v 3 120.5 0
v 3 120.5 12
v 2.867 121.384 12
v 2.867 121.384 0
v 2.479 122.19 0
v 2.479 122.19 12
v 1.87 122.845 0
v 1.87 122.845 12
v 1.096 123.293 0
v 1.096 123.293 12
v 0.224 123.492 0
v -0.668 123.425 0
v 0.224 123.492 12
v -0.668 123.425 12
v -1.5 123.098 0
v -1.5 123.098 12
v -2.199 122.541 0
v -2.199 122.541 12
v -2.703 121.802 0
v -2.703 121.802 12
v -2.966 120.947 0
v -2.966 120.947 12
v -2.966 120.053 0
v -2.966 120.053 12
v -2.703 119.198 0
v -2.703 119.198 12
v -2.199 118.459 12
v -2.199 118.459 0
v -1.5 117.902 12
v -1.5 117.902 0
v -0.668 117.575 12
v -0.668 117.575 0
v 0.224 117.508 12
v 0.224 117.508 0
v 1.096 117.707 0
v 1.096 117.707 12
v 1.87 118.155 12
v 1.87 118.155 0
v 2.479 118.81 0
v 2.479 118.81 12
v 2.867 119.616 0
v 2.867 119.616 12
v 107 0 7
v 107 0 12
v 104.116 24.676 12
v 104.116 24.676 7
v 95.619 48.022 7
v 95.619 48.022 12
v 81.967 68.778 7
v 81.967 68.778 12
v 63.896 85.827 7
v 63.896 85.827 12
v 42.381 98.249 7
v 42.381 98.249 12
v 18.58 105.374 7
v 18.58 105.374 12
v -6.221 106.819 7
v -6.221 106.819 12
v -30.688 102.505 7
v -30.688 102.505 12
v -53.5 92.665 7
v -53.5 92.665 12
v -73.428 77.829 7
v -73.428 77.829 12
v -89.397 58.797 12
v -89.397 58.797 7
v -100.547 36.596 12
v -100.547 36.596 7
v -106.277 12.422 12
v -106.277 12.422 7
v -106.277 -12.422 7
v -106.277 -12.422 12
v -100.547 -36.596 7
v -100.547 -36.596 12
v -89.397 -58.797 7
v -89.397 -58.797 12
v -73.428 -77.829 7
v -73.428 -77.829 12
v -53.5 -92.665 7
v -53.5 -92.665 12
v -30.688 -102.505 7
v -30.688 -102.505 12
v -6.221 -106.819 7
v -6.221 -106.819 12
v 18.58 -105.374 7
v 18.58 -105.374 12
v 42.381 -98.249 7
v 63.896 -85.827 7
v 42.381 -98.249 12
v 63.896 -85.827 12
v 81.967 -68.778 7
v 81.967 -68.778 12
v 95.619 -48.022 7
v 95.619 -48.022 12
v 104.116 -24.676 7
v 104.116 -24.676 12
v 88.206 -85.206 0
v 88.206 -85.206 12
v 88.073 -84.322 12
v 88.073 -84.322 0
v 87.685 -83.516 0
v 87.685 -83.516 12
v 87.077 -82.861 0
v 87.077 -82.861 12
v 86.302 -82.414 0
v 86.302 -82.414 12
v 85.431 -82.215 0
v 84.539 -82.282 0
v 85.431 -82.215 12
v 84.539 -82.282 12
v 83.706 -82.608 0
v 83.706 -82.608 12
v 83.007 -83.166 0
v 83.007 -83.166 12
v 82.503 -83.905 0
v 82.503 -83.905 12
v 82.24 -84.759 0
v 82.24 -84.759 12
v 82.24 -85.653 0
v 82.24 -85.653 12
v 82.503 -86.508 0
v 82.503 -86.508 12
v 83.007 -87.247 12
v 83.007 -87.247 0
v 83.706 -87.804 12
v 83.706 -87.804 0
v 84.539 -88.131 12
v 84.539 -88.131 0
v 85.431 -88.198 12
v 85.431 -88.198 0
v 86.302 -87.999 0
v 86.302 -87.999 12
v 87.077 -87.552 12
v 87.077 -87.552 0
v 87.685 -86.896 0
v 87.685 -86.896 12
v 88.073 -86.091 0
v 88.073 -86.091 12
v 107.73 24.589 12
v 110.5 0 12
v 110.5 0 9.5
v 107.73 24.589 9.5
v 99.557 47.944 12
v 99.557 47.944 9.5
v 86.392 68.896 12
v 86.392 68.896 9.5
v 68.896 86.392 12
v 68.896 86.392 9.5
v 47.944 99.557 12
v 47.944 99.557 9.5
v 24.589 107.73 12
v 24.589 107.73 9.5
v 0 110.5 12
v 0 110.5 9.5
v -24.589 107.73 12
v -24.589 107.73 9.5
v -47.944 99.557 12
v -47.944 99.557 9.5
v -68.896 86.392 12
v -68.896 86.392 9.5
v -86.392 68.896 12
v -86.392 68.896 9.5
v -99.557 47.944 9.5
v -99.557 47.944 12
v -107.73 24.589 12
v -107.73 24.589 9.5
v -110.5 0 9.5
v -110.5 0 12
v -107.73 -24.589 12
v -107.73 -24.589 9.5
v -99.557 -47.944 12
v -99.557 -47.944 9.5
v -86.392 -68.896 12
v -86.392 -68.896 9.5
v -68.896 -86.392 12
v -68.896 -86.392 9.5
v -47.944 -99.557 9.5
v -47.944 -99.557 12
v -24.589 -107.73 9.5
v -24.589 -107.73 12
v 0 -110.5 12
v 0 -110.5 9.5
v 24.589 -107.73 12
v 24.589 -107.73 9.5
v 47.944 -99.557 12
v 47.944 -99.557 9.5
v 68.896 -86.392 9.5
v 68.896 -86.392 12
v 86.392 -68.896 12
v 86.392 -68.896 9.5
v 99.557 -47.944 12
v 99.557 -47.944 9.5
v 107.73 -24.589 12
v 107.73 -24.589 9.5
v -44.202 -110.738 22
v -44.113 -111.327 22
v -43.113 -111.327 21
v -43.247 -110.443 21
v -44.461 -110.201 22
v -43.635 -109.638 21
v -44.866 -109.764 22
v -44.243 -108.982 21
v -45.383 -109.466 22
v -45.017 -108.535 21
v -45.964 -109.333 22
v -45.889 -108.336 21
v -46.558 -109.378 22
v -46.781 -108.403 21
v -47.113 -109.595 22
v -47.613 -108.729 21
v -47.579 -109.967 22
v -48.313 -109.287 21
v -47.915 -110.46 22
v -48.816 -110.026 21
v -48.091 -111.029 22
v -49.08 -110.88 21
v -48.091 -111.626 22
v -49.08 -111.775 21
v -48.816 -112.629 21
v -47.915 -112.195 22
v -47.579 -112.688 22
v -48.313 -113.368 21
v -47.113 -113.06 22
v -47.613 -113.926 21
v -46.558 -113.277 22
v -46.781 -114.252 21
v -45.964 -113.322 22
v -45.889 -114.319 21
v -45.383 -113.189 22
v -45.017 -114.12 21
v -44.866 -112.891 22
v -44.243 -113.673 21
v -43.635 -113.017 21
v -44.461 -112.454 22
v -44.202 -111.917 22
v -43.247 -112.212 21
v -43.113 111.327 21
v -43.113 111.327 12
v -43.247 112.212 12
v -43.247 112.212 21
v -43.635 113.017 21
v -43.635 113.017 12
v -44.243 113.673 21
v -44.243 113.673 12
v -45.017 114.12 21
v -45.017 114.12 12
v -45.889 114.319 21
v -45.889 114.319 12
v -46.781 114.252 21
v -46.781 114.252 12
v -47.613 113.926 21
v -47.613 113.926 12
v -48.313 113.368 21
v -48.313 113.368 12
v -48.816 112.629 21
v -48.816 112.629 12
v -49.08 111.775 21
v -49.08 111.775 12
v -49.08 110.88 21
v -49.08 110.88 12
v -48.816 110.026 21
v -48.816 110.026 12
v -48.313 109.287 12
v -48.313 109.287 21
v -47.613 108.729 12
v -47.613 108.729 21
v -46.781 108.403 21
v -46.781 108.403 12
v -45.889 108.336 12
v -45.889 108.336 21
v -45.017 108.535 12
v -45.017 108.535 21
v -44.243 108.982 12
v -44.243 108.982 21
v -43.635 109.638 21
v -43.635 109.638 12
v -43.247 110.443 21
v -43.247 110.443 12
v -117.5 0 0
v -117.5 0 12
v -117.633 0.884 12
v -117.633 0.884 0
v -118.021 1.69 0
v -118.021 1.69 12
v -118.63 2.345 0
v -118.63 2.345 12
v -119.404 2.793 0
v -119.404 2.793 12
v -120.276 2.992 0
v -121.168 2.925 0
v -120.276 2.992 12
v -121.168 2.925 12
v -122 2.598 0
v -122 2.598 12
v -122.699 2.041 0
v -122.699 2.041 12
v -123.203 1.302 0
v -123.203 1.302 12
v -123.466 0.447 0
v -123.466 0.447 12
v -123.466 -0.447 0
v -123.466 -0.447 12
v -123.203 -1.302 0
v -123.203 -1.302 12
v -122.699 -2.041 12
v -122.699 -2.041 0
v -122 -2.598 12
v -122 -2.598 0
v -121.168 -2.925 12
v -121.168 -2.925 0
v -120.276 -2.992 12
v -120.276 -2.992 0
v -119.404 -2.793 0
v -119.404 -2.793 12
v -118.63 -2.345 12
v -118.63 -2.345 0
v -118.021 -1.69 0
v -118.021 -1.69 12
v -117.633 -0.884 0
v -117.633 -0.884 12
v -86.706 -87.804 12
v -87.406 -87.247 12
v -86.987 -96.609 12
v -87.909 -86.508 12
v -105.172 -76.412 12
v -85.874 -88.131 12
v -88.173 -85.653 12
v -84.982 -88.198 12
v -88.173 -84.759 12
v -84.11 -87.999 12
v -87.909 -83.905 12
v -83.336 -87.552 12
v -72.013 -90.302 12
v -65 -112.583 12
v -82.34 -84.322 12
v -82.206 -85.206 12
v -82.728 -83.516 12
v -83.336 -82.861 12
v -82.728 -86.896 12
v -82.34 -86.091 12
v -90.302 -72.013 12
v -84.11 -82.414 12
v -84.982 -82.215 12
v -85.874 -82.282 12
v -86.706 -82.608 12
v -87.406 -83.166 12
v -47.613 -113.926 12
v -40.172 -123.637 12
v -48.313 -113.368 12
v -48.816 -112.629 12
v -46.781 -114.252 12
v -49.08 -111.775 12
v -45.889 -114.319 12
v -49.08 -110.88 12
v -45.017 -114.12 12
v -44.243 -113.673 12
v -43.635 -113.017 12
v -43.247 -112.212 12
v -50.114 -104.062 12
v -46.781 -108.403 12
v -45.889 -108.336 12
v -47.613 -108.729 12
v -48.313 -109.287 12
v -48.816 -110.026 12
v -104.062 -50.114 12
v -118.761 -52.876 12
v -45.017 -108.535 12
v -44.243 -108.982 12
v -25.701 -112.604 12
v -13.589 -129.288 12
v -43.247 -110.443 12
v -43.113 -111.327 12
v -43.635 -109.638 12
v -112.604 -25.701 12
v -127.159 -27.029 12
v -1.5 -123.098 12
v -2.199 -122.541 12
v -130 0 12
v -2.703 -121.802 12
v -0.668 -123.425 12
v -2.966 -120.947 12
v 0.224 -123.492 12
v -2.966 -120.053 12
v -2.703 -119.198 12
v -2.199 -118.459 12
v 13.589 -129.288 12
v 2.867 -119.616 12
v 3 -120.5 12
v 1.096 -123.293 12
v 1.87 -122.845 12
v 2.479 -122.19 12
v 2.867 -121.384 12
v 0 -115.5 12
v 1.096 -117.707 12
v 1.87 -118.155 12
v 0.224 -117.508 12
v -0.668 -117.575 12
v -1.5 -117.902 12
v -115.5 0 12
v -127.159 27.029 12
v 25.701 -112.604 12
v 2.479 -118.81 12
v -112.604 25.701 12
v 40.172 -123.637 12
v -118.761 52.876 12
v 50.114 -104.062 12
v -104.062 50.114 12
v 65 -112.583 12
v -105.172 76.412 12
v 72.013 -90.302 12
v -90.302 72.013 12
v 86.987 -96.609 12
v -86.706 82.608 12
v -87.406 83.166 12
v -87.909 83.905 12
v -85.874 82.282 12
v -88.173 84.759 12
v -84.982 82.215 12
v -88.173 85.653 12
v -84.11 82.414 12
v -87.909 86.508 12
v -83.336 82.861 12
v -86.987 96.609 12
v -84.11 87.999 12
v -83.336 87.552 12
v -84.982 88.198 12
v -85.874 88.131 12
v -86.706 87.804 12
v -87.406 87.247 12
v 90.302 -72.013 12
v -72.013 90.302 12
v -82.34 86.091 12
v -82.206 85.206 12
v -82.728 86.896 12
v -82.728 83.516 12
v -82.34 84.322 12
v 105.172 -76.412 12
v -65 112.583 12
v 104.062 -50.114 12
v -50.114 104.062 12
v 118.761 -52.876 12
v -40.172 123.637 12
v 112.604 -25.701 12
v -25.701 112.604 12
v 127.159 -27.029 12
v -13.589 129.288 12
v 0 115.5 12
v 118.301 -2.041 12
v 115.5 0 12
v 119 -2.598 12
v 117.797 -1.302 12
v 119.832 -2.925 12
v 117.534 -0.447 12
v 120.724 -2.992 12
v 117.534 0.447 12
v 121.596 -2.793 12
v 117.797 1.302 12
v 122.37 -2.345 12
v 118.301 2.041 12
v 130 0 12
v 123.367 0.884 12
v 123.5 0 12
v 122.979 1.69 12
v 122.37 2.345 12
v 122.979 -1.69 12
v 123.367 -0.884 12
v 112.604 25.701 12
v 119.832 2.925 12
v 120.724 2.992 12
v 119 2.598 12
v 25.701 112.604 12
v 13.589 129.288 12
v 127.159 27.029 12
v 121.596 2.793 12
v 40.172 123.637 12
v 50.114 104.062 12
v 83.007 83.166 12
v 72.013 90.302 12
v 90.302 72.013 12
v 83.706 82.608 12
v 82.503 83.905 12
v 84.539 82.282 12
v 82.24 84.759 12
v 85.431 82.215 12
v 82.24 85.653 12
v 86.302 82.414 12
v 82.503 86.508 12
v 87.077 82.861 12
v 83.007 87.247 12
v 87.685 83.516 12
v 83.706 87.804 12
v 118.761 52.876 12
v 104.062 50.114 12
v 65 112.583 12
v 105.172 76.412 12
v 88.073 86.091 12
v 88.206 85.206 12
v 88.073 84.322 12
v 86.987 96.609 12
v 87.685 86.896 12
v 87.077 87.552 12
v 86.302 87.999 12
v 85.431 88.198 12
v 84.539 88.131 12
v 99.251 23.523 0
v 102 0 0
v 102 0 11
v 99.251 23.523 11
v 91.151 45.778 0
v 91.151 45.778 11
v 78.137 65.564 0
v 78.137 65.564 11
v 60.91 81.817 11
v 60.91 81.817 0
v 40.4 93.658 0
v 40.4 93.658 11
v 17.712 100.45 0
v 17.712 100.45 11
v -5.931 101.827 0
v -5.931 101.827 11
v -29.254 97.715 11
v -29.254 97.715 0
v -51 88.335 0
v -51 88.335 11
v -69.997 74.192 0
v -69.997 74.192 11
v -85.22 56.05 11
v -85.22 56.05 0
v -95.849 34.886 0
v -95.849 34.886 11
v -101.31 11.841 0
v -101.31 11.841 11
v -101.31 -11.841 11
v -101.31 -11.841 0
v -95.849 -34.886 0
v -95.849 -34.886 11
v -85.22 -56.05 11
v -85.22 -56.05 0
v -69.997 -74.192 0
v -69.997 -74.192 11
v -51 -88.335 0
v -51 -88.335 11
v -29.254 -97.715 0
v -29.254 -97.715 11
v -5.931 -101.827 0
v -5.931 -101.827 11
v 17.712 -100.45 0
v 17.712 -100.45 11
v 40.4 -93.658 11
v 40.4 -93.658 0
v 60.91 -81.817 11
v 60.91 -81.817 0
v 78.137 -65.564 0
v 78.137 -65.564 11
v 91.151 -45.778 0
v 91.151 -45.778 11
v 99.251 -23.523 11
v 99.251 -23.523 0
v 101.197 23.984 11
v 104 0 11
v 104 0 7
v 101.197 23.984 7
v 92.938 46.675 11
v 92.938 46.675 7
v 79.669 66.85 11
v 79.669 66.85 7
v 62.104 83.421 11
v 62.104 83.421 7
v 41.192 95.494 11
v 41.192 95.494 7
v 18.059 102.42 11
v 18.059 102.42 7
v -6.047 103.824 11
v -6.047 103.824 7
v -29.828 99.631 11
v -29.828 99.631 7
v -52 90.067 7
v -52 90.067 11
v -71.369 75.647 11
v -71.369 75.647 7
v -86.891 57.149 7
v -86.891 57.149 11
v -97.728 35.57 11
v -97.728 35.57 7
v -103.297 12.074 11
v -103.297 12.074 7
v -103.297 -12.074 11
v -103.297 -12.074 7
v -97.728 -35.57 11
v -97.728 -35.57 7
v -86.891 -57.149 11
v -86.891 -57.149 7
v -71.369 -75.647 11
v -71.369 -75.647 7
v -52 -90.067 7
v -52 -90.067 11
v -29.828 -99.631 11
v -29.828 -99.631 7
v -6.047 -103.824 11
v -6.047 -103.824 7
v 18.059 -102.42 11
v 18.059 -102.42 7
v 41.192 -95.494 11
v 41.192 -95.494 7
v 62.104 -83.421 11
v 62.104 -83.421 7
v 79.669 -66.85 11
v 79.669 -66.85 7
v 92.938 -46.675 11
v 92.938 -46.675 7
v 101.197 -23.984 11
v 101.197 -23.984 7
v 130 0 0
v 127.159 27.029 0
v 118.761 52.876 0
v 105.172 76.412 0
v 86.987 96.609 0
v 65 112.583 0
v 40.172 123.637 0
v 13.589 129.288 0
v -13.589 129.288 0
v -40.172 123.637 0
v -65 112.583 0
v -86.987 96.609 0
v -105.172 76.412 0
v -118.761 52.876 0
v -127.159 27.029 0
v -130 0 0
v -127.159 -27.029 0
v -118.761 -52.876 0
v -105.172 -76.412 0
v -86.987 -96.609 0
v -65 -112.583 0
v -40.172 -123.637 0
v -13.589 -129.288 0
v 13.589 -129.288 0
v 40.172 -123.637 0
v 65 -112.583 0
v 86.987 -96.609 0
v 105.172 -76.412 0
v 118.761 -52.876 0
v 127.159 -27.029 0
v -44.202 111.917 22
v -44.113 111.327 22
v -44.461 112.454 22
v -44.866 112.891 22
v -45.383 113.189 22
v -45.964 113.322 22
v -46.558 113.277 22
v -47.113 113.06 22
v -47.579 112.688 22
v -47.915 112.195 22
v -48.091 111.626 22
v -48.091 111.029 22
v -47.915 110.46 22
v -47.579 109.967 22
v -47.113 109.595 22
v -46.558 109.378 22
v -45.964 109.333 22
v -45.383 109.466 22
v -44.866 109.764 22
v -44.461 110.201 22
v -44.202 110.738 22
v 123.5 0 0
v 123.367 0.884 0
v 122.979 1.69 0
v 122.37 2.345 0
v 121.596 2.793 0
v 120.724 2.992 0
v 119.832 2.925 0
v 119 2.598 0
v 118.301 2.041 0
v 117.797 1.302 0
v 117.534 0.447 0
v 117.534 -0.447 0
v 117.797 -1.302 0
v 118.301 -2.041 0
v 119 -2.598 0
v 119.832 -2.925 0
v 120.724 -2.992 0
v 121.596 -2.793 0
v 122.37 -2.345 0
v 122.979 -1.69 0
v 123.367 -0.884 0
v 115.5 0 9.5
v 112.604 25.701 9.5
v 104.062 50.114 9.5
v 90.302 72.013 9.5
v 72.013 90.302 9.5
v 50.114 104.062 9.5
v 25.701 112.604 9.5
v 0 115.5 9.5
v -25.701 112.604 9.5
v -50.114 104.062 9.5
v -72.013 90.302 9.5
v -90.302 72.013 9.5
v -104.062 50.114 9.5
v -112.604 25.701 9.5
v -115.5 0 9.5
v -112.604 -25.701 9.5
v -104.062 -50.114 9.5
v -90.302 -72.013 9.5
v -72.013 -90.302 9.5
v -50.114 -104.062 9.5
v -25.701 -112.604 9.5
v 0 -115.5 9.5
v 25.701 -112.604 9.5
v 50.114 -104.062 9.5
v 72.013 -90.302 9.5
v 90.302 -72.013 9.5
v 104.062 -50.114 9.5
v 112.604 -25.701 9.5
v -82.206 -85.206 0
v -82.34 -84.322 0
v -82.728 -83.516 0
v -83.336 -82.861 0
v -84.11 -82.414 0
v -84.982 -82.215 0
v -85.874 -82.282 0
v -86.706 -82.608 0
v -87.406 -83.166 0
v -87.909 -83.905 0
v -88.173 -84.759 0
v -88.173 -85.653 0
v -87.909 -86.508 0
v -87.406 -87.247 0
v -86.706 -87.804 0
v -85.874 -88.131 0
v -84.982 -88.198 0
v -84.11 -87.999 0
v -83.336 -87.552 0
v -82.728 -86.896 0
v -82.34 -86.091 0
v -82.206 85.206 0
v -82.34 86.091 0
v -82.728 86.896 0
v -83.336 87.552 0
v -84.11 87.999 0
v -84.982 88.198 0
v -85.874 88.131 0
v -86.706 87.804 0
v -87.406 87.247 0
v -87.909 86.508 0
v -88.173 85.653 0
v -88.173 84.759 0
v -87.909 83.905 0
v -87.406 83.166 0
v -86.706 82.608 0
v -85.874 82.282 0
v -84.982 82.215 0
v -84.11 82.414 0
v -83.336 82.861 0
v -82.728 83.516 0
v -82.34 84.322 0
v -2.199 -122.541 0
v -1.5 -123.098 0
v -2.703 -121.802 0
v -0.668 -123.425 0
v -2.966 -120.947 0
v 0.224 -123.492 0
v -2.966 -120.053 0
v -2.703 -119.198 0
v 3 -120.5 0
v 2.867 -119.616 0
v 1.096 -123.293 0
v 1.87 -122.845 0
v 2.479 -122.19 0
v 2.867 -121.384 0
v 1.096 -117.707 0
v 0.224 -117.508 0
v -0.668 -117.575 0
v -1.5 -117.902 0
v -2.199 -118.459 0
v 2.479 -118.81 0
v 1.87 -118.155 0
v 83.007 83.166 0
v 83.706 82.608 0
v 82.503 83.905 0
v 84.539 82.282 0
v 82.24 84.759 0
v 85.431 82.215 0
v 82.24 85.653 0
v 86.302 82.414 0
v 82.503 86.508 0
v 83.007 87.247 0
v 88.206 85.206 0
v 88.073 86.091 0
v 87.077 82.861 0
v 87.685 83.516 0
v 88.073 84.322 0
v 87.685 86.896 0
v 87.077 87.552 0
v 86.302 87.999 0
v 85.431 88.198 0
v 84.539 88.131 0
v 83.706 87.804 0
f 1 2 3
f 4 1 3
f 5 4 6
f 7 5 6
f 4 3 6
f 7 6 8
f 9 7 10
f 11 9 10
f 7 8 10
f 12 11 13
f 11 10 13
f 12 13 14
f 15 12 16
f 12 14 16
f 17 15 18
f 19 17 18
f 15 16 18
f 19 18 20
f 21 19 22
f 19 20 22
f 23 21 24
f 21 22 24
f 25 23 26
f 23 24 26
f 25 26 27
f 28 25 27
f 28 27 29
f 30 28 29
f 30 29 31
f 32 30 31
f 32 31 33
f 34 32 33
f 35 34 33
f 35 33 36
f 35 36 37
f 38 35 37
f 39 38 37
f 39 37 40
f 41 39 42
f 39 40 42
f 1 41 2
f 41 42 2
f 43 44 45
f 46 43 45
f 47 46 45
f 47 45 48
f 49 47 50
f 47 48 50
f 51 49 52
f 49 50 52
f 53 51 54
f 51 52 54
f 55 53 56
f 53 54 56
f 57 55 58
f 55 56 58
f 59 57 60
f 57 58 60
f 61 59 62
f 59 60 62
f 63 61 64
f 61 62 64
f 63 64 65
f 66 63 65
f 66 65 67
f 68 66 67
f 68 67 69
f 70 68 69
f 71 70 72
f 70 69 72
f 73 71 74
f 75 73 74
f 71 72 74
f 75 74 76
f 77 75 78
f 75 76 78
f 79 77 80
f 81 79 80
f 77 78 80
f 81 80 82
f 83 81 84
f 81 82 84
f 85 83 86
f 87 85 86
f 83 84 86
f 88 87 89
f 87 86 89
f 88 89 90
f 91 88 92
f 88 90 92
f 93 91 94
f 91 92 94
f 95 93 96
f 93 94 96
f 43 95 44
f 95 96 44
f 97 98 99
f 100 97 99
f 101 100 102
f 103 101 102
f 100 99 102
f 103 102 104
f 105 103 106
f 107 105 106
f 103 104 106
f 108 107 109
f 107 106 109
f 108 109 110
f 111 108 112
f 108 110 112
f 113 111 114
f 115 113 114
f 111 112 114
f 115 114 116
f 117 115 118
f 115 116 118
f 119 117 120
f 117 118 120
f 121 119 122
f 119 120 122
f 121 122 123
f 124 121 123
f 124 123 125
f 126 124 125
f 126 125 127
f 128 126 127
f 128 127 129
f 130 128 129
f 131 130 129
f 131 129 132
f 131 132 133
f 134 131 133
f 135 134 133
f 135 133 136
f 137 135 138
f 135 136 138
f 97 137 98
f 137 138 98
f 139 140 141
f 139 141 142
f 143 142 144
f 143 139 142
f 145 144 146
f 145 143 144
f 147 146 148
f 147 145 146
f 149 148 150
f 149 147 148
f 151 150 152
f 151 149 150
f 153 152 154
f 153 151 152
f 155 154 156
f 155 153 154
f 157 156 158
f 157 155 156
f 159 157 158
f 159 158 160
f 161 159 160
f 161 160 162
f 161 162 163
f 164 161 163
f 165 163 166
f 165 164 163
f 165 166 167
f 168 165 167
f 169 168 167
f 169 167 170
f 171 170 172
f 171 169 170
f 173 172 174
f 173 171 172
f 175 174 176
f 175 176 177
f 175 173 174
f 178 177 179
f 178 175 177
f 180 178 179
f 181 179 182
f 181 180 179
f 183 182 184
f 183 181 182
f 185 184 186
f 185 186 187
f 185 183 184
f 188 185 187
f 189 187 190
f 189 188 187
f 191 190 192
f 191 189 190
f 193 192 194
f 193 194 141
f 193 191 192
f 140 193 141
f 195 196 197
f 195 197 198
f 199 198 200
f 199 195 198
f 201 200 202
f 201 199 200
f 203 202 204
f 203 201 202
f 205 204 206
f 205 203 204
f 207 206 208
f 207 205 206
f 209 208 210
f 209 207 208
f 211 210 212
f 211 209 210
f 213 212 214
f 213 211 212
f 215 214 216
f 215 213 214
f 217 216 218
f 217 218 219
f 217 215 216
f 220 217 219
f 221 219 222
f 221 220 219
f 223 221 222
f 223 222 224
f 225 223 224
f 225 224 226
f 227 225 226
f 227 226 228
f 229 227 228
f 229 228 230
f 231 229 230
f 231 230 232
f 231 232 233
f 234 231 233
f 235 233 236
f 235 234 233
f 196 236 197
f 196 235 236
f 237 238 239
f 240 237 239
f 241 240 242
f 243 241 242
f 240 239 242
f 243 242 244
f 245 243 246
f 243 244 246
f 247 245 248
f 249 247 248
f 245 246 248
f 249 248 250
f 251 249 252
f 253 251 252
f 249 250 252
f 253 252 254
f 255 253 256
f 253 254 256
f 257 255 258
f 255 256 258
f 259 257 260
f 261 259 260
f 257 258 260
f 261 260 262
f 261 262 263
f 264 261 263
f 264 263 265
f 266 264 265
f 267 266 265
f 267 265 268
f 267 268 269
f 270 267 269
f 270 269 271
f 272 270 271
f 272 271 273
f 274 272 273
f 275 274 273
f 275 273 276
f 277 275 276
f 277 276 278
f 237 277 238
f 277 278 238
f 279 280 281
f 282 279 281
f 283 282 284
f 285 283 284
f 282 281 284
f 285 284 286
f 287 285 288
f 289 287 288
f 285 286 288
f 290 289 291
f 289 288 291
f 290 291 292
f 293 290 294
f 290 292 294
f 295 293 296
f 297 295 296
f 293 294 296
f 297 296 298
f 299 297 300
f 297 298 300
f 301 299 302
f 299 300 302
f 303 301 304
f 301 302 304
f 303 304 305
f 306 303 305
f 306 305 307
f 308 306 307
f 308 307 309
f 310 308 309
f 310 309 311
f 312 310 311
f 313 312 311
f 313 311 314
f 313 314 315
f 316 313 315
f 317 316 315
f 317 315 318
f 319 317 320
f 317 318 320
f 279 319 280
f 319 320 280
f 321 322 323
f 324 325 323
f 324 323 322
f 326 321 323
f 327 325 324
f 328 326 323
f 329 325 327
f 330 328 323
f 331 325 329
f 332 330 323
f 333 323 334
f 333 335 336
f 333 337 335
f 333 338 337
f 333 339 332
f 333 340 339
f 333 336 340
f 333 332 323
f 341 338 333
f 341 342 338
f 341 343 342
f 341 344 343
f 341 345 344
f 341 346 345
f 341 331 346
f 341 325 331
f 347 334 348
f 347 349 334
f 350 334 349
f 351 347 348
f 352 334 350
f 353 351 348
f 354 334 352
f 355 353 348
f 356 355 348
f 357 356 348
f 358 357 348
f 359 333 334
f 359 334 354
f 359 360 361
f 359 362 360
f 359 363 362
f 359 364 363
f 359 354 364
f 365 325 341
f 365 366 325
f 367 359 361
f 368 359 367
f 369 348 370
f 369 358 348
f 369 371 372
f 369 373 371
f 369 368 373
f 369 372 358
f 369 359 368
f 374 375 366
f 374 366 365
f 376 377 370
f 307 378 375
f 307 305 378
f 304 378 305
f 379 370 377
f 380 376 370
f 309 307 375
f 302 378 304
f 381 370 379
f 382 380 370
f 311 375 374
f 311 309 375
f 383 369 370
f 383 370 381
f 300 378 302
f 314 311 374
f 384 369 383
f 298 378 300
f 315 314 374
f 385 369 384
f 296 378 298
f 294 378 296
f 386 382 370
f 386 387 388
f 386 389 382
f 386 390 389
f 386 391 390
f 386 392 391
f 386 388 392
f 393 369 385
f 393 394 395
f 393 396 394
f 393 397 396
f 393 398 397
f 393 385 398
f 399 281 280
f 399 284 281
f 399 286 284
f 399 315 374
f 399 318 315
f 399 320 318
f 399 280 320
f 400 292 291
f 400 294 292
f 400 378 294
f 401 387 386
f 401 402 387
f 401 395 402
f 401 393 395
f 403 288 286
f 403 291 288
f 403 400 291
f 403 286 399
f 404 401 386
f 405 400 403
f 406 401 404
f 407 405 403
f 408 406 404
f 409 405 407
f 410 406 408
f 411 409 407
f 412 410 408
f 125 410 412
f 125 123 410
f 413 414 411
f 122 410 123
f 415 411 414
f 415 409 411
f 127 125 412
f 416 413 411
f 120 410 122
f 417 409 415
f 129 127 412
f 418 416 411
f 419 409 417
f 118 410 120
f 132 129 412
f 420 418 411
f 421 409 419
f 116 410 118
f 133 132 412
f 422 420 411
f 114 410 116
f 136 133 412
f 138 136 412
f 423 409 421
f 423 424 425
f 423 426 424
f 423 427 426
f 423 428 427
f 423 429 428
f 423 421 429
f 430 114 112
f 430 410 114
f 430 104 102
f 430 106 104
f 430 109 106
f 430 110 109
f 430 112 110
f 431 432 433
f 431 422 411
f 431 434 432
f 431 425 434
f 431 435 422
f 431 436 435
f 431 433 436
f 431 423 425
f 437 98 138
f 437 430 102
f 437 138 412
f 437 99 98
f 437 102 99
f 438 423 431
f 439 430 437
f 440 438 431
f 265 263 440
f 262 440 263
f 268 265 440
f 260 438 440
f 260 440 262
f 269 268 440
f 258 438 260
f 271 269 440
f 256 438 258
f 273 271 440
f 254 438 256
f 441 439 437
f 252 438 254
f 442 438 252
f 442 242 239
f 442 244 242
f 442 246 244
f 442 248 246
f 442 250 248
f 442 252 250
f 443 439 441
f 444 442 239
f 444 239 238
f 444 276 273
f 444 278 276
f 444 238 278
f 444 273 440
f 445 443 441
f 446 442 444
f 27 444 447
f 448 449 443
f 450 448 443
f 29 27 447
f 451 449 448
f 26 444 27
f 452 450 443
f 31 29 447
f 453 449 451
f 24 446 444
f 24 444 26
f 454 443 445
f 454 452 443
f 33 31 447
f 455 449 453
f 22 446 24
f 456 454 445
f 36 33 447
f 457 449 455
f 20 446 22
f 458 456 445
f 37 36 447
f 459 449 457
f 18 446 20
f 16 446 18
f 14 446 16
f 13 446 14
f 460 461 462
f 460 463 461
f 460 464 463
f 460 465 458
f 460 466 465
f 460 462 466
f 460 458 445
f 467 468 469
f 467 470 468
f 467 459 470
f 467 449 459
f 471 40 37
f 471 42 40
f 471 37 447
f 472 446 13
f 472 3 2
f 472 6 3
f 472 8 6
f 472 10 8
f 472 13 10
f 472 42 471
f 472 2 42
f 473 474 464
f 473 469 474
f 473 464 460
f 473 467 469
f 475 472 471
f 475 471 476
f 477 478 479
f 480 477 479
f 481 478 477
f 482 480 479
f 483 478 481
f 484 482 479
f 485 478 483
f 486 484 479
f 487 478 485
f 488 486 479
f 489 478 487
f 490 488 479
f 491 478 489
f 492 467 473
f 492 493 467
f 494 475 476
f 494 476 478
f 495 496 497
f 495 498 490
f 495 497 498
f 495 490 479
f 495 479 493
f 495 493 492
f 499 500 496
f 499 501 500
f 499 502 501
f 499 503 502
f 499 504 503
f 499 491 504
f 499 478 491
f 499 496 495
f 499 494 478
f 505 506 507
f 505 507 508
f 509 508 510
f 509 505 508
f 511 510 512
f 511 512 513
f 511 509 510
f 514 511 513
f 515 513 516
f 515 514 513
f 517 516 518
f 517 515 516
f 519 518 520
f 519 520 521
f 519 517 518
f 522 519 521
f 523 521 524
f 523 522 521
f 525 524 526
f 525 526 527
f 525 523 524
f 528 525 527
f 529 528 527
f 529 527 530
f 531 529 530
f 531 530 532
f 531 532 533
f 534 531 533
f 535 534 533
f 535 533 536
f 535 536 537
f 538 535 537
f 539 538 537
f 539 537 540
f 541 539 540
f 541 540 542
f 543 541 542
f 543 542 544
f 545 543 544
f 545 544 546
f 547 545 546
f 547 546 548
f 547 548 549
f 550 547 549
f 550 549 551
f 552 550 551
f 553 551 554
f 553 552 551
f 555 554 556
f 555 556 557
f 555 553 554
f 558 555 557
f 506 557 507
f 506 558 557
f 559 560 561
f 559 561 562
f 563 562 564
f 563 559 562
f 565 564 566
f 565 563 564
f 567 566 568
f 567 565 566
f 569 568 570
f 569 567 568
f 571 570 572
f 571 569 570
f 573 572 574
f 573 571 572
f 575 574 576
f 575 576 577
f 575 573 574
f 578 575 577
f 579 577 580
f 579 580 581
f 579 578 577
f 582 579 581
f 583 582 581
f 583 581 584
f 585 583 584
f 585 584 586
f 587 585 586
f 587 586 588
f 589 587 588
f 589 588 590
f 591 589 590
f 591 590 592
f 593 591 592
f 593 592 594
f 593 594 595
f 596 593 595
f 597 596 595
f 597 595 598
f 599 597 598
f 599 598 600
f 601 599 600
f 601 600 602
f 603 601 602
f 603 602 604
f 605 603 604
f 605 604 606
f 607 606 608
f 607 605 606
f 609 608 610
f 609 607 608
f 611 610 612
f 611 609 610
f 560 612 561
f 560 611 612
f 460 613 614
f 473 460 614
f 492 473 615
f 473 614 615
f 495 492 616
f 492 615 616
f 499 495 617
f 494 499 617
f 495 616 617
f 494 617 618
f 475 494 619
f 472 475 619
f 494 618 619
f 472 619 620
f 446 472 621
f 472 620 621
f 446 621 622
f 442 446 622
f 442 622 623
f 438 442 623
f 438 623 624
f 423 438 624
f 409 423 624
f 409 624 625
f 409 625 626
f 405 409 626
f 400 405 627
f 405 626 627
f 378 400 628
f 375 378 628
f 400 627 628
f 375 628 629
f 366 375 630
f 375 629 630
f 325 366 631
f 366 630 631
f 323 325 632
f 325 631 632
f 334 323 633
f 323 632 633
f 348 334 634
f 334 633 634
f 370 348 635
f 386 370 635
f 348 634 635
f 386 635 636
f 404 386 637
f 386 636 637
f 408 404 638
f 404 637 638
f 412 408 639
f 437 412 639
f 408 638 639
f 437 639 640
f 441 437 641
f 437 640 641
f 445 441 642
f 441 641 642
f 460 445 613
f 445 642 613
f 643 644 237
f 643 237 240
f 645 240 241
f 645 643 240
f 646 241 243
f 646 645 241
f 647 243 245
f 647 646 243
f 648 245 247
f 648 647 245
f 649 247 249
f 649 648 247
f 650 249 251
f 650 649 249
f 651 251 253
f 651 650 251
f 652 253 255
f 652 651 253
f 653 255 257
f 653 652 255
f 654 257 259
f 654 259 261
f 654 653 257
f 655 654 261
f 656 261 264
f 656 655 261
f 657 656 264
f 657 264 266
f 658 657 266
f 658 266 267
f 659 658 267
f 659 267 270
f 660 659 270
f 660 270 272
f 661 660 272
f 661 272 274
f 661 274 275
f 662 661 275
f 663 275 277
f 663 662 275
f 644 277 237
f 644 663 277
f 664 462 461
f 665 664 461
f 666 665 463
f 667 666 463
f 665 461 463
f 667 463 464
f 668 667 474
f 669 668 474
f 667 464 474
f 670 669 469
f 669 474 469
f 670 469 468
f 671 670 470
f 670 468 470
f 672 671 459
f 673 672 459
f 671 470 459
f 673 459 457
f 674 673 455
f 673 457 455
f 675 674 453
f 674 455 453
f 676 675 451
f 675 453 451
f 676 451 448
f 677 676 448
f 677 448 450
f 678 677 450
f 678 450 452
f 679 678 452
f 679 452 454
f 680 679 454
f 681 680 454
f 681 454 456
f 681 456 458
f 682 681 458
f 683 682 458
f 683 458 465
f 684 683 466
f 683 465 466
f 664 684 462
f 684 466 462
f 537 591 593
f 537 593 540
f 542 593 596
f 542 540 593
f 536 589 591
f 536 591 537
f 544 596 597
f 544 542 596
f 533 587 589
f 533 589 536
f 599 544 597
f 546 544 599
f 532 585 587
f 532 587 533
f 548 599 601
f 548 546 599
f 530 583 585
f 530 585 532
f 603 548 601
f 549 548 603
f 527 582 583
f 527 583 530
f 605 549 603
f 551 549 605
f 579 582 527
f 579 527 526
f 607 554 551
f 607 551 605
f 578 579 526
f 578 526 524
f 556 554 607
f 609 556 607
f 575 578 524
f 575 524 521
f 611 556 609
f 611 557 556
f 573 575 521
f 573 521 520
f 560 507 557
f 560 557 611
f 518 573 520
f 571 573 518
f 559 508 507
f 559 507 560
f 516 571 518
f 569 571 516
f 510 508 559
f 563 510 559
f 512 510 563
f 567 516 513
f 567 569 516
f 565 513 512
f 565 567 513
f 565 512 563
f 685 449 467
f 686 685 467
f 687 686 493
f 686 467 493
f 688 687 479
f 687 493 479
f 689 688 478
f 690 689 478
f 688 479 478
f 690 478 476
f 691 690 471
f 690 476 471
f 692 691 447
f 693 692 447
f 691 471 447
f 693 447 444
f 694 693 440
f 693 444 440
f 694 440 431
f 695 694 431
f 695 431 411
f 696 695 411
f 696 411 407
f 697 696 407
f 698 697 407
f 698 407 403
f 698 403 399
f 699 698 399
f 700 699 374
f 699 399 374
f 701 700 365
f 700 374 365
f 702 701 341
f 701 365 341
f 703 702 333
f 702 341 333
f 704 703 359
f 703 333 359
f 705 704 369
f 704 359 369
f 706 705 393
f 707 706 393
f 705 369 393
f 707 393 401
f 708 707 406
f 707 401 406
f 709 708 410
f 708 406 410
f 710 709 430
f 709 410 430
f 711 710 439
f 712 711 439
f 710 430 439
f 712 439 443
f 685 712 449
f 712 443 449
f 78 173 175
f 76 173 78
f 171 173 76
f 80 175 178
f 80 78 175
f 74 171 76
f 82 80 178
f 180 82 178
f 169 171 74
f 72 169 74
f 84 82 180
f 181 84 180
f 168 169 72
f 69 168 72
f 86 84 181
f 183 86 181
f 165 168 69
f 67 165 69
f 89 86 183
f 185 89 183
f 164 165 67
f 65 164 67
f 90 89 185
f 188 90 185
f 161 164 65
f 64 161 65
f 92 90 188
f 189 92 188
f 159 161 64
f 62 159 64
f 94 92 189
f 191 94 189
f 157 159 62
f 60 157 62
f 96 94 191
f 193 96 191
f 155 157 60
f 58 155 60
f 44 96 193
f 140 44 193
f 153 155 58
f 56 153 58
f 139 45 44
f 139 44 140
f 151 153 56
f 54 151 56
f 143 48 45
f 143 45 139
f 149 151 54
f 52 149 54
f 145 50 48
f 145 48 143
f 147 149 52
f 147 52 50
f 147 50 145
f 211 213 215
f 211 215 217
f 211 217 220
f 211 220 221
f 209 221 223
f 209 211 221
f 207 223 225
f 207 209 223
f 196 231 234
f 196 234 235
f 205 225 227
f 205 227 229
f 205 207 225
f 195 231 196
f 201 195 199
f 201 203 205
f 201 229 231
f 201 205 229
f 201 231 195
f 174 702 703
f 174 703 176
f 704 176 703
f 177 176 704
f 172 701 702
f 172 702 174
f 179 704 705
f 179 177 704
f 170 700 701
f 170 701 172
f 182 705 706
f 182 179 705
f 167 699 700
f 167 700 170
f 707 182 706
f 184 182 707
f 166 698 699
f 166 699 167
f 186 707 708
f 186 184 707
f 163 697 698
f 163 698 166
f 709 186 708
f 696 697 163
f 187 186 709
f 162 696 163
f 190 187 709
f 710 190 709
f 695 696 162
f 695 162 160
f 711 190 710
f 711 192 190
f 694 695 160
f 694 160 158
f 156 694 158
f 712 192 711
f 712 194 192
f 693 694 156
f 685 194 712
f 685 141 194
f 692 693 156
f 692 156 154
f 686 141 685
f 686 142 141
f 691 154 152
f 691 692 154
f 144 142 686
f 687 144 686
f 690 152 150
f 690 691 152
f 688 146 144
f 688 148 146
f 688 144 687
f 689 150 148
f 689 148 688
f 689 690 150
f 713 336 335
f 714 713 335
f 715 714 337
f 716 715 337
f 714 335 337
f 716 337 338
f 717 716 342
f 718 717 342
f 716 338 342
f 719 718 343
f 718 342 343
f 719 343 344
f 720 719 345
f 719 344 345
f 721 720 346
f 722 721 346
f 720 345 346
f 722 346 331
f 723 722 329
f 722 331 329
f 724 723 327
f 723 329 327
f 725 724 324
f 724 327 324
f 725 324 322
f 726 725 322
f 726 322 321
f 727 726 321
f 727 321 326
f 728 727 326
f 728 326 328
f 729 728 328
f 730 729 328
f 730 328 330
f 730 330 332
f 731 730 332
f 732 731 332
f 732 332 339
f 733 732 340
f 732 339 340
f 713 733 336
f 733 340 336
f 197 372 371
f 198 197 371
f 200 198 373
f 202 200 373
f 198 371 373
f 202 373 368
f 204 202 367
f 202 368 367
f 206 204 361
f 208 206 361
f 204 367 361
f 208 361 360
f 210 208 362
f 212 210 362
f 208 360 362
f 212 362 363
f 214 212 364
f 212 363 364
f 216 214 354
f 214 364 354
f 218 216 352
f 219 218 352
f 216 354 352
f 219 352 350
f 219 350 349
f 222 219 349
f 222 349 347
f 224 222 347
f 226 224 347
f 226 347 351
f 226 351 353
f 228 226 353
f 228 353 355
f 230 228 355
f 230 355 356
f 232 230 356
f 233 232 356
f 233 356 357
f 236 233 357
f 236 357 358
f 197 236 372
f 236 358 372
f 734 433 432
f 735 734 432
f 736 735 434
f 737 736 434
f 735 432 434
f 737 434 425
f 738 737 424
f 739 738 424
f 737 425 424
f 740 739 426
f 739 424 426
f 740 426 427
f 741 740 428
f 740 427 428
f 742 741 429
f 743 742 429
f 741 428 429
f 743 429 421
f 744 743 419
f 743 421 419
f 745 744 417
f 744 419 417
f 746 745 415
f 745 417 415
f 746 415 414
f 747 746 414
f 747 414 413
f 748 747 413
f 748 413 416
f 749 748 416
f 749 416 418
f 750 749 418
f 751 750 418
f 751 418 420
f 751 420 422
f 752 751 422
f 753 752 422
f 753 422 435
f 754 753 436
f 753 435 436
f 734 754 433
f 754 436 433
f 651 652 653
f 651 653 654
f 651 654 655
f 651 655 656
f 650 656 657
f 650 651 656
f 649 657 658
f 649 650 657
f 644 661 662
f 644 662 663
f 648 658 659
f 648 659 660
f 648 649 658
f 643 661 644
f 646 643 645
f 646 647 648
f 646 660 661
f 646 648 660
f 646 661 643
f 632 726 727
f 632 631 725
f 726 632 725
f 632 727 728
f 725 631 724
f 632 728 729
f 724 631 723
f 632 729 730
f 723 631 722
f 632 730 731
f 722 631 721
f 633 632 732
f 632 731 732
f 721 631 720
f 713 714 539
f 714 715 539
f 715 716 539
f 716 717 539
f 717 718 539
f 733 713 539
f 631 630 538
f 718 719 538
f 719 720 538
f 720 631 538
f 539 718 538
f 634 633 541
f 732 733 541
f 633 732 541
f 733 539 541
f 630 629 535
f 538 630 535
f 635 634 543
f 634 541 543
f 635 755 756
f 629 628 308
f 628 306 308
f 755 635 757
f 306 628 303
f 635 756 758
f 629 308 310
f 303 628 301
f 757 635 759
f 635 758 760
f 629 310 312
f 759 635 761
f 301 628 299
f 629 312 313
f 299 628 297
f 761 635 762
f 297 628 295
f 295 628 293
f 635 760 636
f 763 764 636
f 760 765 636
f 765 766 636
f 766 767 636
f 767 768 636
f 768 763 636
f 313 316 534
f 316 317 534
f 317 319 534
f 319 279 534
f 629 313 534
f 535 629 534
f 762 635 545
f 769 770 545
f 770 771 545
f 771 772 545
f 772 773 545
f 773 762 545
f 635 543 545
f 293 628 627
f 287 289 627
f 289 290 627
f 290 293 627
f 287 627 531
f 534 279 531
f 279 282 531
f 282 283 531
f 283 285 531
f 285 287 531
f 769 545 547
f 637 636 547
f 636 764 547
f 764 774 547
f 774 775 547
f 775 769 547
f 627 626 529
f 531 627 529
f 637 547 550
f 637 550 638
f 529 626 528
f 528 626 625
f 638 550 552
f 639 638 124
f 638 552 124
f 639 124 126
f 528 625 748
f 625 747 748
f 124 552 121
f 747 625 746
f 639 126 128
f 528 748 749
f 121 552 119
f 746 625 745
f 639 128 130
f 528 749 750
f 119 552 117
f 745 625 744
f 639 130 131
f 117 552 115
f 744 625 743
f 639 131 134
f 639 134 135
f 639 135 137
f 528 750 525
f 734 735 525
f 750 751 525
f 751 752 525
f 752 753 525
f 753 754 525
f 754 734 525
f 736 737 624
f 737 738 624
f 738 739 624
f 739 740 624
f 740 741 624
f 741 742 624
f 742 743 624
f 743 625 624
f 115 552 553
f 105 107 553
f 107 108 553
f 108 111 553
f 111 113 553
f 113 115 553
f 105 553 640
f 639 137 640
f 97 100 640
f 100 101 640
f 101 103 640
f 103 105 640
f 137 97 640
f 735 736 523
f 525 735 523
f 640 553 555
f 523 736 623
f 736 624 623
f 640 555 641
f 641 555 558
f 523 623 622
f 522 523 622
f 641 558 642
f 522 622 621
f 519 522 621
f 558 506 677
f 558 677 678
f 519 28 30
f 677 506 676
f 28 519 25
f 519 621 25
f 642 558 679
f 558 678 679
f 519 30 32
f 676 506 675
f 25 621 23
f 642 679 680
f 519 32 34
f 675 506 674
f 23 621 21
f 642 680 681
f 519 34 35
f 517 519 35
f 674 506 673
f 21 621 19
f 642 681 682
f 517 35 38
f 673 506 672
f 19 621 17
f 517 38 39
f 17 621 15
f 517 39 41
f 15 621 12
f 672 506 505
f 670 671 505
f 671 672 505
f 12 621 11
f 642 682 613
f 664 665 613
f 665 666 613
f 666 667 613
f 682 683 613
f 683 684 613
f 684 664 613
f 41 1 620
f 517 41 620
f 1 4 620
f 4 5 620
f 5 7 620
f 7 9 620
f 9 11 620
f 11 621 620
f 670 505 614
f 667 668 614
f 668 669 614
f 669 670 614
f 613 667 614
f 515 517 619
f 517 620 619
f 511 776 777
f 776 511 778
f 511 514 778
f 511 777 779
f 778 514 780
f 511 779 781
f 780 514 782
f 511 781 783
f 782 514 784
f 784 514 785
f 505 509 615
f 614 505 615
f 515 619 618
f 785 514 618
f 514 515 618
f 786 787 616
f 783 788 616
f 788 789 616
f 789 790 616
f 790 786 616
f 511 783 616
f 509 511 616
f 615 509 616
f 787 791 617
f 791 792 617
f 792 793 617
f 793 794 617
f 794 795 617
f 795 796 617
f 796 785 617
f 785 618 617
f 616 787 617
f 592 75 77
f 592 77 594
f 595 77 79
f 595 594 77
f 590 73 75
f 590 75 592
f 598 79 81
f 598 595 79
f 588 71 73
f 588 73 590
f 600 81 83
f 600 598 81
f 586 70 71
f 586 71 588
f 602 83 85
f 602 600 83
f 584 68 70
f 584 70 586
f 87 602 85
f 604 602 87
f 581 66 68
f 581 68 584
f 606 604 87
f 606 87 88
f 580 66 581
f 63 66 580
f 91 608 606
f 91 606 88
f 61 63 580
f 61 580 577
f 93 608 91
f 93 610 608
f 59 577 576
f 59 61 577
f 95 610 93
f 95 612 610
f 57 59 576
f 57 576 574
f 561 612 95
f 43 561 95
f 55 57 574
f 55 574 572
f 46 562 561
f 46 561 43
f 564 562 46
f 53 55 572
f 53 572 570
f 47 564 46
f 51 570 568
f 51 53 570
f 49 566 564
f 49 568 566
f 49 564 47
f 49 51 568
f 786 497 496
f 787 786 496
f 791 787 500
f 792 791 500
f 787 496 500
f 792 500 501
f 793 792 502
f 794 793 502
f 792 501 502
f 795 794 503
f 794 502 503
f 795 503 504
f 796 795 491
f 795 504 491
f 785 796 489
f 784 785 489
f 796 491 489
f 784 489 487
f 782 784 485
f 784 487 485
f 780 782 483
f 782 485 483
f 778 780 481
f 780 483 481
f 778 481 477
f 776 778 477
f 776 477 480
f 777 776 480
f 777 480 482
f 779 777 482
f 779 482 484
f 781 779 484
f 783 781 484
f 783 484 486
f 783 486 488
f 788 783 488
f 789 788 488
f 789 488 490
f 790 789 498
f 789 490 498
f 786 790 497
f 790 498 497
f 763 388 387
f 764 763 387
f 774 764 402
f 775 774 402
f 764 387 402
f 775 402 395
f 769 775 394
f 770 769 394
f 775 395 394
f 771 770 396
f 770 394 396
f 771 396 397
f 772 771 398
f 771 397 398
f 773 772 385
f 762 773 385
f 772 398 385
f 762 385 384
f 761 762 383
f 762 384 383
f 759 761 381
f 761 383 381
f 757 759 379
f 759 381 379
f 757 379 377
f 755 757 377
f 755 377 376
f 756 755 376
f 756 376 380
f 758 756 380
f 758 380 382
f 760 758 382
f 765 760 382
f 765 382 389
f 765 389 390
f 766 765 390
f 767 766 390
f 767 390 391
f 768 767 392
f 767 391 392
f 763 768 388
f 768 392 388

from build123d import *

# Parameters (mm, degrees)
F0_R      = 130
F0_R_2    = 102
F1_DEPTH  = 12
F2_R      = 115.5
F2_R_2    = 110.5
F3_DEPTH  = 2.5
F4_R      = 107
F4_R_2    = 104
F5_DEPTH  = 5
F6_R      = 104
F6_R_2    = 102
F7_DEPTH  = 1
F8_R      = 3
F9_DEPTH  = 12
F10_DEPTH = 10
F11_SIZE  = 1
F12_SIZE  = 1


with BuildPart() as f1:
    # F0 (on Top) → F1 (new body)
    with BuildSketch(Plane.XY):
        Circle(F0_R)
        Circle(F0_R_2, mode=Mode.SUBTRACT)
    extrude(amount=F1_DEPTH)

    # F2 (on face) → F3 (cut)
    with BuildSketch(Plane.XY.offset(12)):
        Circle(F2_R)
        Circle(F2_R_2, mode=Mode.SUBTRACT)
    extrude(amount=-F3_DEPTH, mode=Mode.SUBTRACT)

    # F4 (on face) → F5 (cut)
    with BuildSketch(Plane.XY.offset(12)):
        Circle(F4_R)
        Circle(F4_R_2, mode=Mode.SUBTRACT)
    extrude(amount=-F5_DEPTH, mode=Mode.SUBTRACT)

    # F6 (on face) → F7 (cut)
    with BuildSketch(Plane.XY.offset(12)):
        Circle(F6_R)
        Circle(F6_R_2, mode=Mode.SUBTRACT)
    extrude(amount=-F7_DEPTH, mode=Mode.SUBTRACT)

    # F8 (on face) → F9 (cut)
    with BuildSketch(Plane.XY.offset(12)):
        with Locations((-120.5, 0)):
            Circle(F8_R)
        with Locations((-85.206367, 85.206367)):
            Circle(F8_R)
        with Locations((0, 120.5)):
            Circle(F8_R)
        with Locations((120.5, 0)):
            Circle(F8_R)
        with Locations((85.206367, 85.206367)):
            Circle(F8_R)
        with Locations((85.206367, -85.206367)):
            Circle(F8_R)
        with Locations((0, -120.5)):
            Circle(F8_R)
        with Locations((-85.206367, -85.206367)):
            Circle(F8_R)
    extrude(amount=-F9_DEPTH, mode=Mode.SUBTRACT)

    # F8 (on face) → F10 (join)
    with BuildSketch(Plane.XY.offset(12)):
        with Locations((-46.113354, 111.327484)):
            Circle(F8_R)
        with Locations((-46.113354, -111.327484)):
            Circle(F8_R)
    extrude(amount=F10_DEPTH)

    # F11
    f11_edges = [f1.edges().sort_by_distance(p)[0] for p in [
        (-49.113354, -111.327484, 22),
    ]]
    chamfer(f11_edges, length=F11_SIZE)

    # F12
    f12_edges = [f1.edges().sort_by_distance(p)[0] for p in [
        (-49.113354, 111.327484, 22),
    ]]
    chamfer(f12_edges, length=F12_SIZE)


solid = f1.part
